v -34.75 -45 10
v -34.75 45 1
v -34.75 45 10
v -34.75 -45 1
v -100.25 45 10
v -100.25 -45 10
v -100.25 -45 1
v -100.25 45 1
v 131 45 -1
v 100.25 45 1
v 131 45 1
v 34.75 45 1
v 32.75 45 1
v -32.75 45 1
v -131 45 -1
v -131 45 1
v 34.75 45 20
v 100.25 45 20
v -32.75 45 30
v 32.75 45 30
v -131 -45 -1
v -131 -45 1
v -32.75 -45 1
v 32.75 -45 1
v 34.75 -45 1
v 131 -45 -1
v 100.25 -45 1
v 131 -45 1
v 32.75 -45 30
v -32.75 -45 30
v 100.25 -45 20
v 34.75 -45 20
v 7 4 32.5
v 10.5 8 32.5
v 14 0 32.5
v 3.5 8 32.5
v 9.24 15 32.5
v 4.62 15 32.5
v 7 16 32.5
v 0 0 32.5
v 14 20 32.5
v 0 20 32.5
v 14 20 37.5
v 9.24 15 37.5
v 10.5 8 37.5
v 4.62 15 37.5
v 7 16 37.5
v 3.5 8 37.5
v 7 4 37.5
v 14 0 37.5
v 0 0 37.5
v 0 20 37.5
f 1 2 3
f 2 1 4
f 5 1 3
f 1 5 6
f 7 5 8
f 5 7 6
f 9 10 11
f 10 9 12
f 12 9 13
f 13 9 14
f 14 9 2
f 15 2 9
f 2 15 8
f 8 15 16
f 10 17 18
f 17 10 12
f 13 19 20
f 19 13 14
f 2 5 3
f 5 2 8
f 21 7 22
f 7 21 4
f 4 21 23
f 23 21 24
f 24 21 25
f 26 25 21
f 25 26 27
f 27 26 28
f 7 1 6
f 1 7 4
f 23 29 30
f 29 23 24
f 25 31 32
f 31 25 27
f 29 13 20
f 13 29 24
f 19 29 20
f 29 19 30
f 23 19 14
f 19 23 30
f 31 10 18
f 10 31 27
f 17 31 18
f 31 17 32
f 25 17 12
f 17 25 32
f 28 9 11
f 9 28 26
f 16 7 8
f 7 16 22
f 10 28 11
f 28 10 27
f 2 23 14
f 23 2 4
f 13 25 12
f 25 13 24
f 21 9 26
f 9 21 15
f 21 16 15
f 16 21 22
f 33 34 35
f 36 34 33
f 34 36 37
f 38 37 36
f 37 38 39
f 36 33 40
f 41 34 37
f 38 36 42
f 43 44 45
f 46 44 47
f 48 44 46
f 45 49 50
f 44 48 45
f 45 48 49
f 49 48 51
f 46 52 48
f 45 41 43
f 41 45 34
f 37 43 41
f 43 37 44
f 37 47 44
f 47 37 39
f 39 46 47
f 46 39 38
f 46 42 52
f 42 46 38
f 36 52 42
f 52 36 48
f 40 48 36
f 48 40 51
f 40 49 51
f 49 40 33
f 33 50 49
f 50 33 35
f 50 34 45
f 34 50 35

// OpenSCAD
union () {
  translate ([0, 0, 0]) {
    cube ([262.0, 90, 2], center=true);
  }
  union () {
    translate ([-67.5, 0, 5]) {
      cube ([65.5, 90, 10], center=true);
    }
    translate ([0, 0, 15]) {
      cube ([65.5, 90, 30], center=true);
    }
    translate ([67.5, 0, 10]) {
      cube ([65.5, 90, 20], center=true);
    }
  }
  translate ([0, 0, 35]) {
    color ([0.5, 0.5, 0.5, 1]) {
      linear_extrude (height=5, center=true){
        polygon (points=[[14, 20], [9.24, 15.0], [7.0, 16.0], [4.62, 15.0], [0, 20], [3.5, 8.0], [0, 0], [7.0, 4.0], [14, 0], [10.5, 8.0]]);
      }
    }
  }
}
